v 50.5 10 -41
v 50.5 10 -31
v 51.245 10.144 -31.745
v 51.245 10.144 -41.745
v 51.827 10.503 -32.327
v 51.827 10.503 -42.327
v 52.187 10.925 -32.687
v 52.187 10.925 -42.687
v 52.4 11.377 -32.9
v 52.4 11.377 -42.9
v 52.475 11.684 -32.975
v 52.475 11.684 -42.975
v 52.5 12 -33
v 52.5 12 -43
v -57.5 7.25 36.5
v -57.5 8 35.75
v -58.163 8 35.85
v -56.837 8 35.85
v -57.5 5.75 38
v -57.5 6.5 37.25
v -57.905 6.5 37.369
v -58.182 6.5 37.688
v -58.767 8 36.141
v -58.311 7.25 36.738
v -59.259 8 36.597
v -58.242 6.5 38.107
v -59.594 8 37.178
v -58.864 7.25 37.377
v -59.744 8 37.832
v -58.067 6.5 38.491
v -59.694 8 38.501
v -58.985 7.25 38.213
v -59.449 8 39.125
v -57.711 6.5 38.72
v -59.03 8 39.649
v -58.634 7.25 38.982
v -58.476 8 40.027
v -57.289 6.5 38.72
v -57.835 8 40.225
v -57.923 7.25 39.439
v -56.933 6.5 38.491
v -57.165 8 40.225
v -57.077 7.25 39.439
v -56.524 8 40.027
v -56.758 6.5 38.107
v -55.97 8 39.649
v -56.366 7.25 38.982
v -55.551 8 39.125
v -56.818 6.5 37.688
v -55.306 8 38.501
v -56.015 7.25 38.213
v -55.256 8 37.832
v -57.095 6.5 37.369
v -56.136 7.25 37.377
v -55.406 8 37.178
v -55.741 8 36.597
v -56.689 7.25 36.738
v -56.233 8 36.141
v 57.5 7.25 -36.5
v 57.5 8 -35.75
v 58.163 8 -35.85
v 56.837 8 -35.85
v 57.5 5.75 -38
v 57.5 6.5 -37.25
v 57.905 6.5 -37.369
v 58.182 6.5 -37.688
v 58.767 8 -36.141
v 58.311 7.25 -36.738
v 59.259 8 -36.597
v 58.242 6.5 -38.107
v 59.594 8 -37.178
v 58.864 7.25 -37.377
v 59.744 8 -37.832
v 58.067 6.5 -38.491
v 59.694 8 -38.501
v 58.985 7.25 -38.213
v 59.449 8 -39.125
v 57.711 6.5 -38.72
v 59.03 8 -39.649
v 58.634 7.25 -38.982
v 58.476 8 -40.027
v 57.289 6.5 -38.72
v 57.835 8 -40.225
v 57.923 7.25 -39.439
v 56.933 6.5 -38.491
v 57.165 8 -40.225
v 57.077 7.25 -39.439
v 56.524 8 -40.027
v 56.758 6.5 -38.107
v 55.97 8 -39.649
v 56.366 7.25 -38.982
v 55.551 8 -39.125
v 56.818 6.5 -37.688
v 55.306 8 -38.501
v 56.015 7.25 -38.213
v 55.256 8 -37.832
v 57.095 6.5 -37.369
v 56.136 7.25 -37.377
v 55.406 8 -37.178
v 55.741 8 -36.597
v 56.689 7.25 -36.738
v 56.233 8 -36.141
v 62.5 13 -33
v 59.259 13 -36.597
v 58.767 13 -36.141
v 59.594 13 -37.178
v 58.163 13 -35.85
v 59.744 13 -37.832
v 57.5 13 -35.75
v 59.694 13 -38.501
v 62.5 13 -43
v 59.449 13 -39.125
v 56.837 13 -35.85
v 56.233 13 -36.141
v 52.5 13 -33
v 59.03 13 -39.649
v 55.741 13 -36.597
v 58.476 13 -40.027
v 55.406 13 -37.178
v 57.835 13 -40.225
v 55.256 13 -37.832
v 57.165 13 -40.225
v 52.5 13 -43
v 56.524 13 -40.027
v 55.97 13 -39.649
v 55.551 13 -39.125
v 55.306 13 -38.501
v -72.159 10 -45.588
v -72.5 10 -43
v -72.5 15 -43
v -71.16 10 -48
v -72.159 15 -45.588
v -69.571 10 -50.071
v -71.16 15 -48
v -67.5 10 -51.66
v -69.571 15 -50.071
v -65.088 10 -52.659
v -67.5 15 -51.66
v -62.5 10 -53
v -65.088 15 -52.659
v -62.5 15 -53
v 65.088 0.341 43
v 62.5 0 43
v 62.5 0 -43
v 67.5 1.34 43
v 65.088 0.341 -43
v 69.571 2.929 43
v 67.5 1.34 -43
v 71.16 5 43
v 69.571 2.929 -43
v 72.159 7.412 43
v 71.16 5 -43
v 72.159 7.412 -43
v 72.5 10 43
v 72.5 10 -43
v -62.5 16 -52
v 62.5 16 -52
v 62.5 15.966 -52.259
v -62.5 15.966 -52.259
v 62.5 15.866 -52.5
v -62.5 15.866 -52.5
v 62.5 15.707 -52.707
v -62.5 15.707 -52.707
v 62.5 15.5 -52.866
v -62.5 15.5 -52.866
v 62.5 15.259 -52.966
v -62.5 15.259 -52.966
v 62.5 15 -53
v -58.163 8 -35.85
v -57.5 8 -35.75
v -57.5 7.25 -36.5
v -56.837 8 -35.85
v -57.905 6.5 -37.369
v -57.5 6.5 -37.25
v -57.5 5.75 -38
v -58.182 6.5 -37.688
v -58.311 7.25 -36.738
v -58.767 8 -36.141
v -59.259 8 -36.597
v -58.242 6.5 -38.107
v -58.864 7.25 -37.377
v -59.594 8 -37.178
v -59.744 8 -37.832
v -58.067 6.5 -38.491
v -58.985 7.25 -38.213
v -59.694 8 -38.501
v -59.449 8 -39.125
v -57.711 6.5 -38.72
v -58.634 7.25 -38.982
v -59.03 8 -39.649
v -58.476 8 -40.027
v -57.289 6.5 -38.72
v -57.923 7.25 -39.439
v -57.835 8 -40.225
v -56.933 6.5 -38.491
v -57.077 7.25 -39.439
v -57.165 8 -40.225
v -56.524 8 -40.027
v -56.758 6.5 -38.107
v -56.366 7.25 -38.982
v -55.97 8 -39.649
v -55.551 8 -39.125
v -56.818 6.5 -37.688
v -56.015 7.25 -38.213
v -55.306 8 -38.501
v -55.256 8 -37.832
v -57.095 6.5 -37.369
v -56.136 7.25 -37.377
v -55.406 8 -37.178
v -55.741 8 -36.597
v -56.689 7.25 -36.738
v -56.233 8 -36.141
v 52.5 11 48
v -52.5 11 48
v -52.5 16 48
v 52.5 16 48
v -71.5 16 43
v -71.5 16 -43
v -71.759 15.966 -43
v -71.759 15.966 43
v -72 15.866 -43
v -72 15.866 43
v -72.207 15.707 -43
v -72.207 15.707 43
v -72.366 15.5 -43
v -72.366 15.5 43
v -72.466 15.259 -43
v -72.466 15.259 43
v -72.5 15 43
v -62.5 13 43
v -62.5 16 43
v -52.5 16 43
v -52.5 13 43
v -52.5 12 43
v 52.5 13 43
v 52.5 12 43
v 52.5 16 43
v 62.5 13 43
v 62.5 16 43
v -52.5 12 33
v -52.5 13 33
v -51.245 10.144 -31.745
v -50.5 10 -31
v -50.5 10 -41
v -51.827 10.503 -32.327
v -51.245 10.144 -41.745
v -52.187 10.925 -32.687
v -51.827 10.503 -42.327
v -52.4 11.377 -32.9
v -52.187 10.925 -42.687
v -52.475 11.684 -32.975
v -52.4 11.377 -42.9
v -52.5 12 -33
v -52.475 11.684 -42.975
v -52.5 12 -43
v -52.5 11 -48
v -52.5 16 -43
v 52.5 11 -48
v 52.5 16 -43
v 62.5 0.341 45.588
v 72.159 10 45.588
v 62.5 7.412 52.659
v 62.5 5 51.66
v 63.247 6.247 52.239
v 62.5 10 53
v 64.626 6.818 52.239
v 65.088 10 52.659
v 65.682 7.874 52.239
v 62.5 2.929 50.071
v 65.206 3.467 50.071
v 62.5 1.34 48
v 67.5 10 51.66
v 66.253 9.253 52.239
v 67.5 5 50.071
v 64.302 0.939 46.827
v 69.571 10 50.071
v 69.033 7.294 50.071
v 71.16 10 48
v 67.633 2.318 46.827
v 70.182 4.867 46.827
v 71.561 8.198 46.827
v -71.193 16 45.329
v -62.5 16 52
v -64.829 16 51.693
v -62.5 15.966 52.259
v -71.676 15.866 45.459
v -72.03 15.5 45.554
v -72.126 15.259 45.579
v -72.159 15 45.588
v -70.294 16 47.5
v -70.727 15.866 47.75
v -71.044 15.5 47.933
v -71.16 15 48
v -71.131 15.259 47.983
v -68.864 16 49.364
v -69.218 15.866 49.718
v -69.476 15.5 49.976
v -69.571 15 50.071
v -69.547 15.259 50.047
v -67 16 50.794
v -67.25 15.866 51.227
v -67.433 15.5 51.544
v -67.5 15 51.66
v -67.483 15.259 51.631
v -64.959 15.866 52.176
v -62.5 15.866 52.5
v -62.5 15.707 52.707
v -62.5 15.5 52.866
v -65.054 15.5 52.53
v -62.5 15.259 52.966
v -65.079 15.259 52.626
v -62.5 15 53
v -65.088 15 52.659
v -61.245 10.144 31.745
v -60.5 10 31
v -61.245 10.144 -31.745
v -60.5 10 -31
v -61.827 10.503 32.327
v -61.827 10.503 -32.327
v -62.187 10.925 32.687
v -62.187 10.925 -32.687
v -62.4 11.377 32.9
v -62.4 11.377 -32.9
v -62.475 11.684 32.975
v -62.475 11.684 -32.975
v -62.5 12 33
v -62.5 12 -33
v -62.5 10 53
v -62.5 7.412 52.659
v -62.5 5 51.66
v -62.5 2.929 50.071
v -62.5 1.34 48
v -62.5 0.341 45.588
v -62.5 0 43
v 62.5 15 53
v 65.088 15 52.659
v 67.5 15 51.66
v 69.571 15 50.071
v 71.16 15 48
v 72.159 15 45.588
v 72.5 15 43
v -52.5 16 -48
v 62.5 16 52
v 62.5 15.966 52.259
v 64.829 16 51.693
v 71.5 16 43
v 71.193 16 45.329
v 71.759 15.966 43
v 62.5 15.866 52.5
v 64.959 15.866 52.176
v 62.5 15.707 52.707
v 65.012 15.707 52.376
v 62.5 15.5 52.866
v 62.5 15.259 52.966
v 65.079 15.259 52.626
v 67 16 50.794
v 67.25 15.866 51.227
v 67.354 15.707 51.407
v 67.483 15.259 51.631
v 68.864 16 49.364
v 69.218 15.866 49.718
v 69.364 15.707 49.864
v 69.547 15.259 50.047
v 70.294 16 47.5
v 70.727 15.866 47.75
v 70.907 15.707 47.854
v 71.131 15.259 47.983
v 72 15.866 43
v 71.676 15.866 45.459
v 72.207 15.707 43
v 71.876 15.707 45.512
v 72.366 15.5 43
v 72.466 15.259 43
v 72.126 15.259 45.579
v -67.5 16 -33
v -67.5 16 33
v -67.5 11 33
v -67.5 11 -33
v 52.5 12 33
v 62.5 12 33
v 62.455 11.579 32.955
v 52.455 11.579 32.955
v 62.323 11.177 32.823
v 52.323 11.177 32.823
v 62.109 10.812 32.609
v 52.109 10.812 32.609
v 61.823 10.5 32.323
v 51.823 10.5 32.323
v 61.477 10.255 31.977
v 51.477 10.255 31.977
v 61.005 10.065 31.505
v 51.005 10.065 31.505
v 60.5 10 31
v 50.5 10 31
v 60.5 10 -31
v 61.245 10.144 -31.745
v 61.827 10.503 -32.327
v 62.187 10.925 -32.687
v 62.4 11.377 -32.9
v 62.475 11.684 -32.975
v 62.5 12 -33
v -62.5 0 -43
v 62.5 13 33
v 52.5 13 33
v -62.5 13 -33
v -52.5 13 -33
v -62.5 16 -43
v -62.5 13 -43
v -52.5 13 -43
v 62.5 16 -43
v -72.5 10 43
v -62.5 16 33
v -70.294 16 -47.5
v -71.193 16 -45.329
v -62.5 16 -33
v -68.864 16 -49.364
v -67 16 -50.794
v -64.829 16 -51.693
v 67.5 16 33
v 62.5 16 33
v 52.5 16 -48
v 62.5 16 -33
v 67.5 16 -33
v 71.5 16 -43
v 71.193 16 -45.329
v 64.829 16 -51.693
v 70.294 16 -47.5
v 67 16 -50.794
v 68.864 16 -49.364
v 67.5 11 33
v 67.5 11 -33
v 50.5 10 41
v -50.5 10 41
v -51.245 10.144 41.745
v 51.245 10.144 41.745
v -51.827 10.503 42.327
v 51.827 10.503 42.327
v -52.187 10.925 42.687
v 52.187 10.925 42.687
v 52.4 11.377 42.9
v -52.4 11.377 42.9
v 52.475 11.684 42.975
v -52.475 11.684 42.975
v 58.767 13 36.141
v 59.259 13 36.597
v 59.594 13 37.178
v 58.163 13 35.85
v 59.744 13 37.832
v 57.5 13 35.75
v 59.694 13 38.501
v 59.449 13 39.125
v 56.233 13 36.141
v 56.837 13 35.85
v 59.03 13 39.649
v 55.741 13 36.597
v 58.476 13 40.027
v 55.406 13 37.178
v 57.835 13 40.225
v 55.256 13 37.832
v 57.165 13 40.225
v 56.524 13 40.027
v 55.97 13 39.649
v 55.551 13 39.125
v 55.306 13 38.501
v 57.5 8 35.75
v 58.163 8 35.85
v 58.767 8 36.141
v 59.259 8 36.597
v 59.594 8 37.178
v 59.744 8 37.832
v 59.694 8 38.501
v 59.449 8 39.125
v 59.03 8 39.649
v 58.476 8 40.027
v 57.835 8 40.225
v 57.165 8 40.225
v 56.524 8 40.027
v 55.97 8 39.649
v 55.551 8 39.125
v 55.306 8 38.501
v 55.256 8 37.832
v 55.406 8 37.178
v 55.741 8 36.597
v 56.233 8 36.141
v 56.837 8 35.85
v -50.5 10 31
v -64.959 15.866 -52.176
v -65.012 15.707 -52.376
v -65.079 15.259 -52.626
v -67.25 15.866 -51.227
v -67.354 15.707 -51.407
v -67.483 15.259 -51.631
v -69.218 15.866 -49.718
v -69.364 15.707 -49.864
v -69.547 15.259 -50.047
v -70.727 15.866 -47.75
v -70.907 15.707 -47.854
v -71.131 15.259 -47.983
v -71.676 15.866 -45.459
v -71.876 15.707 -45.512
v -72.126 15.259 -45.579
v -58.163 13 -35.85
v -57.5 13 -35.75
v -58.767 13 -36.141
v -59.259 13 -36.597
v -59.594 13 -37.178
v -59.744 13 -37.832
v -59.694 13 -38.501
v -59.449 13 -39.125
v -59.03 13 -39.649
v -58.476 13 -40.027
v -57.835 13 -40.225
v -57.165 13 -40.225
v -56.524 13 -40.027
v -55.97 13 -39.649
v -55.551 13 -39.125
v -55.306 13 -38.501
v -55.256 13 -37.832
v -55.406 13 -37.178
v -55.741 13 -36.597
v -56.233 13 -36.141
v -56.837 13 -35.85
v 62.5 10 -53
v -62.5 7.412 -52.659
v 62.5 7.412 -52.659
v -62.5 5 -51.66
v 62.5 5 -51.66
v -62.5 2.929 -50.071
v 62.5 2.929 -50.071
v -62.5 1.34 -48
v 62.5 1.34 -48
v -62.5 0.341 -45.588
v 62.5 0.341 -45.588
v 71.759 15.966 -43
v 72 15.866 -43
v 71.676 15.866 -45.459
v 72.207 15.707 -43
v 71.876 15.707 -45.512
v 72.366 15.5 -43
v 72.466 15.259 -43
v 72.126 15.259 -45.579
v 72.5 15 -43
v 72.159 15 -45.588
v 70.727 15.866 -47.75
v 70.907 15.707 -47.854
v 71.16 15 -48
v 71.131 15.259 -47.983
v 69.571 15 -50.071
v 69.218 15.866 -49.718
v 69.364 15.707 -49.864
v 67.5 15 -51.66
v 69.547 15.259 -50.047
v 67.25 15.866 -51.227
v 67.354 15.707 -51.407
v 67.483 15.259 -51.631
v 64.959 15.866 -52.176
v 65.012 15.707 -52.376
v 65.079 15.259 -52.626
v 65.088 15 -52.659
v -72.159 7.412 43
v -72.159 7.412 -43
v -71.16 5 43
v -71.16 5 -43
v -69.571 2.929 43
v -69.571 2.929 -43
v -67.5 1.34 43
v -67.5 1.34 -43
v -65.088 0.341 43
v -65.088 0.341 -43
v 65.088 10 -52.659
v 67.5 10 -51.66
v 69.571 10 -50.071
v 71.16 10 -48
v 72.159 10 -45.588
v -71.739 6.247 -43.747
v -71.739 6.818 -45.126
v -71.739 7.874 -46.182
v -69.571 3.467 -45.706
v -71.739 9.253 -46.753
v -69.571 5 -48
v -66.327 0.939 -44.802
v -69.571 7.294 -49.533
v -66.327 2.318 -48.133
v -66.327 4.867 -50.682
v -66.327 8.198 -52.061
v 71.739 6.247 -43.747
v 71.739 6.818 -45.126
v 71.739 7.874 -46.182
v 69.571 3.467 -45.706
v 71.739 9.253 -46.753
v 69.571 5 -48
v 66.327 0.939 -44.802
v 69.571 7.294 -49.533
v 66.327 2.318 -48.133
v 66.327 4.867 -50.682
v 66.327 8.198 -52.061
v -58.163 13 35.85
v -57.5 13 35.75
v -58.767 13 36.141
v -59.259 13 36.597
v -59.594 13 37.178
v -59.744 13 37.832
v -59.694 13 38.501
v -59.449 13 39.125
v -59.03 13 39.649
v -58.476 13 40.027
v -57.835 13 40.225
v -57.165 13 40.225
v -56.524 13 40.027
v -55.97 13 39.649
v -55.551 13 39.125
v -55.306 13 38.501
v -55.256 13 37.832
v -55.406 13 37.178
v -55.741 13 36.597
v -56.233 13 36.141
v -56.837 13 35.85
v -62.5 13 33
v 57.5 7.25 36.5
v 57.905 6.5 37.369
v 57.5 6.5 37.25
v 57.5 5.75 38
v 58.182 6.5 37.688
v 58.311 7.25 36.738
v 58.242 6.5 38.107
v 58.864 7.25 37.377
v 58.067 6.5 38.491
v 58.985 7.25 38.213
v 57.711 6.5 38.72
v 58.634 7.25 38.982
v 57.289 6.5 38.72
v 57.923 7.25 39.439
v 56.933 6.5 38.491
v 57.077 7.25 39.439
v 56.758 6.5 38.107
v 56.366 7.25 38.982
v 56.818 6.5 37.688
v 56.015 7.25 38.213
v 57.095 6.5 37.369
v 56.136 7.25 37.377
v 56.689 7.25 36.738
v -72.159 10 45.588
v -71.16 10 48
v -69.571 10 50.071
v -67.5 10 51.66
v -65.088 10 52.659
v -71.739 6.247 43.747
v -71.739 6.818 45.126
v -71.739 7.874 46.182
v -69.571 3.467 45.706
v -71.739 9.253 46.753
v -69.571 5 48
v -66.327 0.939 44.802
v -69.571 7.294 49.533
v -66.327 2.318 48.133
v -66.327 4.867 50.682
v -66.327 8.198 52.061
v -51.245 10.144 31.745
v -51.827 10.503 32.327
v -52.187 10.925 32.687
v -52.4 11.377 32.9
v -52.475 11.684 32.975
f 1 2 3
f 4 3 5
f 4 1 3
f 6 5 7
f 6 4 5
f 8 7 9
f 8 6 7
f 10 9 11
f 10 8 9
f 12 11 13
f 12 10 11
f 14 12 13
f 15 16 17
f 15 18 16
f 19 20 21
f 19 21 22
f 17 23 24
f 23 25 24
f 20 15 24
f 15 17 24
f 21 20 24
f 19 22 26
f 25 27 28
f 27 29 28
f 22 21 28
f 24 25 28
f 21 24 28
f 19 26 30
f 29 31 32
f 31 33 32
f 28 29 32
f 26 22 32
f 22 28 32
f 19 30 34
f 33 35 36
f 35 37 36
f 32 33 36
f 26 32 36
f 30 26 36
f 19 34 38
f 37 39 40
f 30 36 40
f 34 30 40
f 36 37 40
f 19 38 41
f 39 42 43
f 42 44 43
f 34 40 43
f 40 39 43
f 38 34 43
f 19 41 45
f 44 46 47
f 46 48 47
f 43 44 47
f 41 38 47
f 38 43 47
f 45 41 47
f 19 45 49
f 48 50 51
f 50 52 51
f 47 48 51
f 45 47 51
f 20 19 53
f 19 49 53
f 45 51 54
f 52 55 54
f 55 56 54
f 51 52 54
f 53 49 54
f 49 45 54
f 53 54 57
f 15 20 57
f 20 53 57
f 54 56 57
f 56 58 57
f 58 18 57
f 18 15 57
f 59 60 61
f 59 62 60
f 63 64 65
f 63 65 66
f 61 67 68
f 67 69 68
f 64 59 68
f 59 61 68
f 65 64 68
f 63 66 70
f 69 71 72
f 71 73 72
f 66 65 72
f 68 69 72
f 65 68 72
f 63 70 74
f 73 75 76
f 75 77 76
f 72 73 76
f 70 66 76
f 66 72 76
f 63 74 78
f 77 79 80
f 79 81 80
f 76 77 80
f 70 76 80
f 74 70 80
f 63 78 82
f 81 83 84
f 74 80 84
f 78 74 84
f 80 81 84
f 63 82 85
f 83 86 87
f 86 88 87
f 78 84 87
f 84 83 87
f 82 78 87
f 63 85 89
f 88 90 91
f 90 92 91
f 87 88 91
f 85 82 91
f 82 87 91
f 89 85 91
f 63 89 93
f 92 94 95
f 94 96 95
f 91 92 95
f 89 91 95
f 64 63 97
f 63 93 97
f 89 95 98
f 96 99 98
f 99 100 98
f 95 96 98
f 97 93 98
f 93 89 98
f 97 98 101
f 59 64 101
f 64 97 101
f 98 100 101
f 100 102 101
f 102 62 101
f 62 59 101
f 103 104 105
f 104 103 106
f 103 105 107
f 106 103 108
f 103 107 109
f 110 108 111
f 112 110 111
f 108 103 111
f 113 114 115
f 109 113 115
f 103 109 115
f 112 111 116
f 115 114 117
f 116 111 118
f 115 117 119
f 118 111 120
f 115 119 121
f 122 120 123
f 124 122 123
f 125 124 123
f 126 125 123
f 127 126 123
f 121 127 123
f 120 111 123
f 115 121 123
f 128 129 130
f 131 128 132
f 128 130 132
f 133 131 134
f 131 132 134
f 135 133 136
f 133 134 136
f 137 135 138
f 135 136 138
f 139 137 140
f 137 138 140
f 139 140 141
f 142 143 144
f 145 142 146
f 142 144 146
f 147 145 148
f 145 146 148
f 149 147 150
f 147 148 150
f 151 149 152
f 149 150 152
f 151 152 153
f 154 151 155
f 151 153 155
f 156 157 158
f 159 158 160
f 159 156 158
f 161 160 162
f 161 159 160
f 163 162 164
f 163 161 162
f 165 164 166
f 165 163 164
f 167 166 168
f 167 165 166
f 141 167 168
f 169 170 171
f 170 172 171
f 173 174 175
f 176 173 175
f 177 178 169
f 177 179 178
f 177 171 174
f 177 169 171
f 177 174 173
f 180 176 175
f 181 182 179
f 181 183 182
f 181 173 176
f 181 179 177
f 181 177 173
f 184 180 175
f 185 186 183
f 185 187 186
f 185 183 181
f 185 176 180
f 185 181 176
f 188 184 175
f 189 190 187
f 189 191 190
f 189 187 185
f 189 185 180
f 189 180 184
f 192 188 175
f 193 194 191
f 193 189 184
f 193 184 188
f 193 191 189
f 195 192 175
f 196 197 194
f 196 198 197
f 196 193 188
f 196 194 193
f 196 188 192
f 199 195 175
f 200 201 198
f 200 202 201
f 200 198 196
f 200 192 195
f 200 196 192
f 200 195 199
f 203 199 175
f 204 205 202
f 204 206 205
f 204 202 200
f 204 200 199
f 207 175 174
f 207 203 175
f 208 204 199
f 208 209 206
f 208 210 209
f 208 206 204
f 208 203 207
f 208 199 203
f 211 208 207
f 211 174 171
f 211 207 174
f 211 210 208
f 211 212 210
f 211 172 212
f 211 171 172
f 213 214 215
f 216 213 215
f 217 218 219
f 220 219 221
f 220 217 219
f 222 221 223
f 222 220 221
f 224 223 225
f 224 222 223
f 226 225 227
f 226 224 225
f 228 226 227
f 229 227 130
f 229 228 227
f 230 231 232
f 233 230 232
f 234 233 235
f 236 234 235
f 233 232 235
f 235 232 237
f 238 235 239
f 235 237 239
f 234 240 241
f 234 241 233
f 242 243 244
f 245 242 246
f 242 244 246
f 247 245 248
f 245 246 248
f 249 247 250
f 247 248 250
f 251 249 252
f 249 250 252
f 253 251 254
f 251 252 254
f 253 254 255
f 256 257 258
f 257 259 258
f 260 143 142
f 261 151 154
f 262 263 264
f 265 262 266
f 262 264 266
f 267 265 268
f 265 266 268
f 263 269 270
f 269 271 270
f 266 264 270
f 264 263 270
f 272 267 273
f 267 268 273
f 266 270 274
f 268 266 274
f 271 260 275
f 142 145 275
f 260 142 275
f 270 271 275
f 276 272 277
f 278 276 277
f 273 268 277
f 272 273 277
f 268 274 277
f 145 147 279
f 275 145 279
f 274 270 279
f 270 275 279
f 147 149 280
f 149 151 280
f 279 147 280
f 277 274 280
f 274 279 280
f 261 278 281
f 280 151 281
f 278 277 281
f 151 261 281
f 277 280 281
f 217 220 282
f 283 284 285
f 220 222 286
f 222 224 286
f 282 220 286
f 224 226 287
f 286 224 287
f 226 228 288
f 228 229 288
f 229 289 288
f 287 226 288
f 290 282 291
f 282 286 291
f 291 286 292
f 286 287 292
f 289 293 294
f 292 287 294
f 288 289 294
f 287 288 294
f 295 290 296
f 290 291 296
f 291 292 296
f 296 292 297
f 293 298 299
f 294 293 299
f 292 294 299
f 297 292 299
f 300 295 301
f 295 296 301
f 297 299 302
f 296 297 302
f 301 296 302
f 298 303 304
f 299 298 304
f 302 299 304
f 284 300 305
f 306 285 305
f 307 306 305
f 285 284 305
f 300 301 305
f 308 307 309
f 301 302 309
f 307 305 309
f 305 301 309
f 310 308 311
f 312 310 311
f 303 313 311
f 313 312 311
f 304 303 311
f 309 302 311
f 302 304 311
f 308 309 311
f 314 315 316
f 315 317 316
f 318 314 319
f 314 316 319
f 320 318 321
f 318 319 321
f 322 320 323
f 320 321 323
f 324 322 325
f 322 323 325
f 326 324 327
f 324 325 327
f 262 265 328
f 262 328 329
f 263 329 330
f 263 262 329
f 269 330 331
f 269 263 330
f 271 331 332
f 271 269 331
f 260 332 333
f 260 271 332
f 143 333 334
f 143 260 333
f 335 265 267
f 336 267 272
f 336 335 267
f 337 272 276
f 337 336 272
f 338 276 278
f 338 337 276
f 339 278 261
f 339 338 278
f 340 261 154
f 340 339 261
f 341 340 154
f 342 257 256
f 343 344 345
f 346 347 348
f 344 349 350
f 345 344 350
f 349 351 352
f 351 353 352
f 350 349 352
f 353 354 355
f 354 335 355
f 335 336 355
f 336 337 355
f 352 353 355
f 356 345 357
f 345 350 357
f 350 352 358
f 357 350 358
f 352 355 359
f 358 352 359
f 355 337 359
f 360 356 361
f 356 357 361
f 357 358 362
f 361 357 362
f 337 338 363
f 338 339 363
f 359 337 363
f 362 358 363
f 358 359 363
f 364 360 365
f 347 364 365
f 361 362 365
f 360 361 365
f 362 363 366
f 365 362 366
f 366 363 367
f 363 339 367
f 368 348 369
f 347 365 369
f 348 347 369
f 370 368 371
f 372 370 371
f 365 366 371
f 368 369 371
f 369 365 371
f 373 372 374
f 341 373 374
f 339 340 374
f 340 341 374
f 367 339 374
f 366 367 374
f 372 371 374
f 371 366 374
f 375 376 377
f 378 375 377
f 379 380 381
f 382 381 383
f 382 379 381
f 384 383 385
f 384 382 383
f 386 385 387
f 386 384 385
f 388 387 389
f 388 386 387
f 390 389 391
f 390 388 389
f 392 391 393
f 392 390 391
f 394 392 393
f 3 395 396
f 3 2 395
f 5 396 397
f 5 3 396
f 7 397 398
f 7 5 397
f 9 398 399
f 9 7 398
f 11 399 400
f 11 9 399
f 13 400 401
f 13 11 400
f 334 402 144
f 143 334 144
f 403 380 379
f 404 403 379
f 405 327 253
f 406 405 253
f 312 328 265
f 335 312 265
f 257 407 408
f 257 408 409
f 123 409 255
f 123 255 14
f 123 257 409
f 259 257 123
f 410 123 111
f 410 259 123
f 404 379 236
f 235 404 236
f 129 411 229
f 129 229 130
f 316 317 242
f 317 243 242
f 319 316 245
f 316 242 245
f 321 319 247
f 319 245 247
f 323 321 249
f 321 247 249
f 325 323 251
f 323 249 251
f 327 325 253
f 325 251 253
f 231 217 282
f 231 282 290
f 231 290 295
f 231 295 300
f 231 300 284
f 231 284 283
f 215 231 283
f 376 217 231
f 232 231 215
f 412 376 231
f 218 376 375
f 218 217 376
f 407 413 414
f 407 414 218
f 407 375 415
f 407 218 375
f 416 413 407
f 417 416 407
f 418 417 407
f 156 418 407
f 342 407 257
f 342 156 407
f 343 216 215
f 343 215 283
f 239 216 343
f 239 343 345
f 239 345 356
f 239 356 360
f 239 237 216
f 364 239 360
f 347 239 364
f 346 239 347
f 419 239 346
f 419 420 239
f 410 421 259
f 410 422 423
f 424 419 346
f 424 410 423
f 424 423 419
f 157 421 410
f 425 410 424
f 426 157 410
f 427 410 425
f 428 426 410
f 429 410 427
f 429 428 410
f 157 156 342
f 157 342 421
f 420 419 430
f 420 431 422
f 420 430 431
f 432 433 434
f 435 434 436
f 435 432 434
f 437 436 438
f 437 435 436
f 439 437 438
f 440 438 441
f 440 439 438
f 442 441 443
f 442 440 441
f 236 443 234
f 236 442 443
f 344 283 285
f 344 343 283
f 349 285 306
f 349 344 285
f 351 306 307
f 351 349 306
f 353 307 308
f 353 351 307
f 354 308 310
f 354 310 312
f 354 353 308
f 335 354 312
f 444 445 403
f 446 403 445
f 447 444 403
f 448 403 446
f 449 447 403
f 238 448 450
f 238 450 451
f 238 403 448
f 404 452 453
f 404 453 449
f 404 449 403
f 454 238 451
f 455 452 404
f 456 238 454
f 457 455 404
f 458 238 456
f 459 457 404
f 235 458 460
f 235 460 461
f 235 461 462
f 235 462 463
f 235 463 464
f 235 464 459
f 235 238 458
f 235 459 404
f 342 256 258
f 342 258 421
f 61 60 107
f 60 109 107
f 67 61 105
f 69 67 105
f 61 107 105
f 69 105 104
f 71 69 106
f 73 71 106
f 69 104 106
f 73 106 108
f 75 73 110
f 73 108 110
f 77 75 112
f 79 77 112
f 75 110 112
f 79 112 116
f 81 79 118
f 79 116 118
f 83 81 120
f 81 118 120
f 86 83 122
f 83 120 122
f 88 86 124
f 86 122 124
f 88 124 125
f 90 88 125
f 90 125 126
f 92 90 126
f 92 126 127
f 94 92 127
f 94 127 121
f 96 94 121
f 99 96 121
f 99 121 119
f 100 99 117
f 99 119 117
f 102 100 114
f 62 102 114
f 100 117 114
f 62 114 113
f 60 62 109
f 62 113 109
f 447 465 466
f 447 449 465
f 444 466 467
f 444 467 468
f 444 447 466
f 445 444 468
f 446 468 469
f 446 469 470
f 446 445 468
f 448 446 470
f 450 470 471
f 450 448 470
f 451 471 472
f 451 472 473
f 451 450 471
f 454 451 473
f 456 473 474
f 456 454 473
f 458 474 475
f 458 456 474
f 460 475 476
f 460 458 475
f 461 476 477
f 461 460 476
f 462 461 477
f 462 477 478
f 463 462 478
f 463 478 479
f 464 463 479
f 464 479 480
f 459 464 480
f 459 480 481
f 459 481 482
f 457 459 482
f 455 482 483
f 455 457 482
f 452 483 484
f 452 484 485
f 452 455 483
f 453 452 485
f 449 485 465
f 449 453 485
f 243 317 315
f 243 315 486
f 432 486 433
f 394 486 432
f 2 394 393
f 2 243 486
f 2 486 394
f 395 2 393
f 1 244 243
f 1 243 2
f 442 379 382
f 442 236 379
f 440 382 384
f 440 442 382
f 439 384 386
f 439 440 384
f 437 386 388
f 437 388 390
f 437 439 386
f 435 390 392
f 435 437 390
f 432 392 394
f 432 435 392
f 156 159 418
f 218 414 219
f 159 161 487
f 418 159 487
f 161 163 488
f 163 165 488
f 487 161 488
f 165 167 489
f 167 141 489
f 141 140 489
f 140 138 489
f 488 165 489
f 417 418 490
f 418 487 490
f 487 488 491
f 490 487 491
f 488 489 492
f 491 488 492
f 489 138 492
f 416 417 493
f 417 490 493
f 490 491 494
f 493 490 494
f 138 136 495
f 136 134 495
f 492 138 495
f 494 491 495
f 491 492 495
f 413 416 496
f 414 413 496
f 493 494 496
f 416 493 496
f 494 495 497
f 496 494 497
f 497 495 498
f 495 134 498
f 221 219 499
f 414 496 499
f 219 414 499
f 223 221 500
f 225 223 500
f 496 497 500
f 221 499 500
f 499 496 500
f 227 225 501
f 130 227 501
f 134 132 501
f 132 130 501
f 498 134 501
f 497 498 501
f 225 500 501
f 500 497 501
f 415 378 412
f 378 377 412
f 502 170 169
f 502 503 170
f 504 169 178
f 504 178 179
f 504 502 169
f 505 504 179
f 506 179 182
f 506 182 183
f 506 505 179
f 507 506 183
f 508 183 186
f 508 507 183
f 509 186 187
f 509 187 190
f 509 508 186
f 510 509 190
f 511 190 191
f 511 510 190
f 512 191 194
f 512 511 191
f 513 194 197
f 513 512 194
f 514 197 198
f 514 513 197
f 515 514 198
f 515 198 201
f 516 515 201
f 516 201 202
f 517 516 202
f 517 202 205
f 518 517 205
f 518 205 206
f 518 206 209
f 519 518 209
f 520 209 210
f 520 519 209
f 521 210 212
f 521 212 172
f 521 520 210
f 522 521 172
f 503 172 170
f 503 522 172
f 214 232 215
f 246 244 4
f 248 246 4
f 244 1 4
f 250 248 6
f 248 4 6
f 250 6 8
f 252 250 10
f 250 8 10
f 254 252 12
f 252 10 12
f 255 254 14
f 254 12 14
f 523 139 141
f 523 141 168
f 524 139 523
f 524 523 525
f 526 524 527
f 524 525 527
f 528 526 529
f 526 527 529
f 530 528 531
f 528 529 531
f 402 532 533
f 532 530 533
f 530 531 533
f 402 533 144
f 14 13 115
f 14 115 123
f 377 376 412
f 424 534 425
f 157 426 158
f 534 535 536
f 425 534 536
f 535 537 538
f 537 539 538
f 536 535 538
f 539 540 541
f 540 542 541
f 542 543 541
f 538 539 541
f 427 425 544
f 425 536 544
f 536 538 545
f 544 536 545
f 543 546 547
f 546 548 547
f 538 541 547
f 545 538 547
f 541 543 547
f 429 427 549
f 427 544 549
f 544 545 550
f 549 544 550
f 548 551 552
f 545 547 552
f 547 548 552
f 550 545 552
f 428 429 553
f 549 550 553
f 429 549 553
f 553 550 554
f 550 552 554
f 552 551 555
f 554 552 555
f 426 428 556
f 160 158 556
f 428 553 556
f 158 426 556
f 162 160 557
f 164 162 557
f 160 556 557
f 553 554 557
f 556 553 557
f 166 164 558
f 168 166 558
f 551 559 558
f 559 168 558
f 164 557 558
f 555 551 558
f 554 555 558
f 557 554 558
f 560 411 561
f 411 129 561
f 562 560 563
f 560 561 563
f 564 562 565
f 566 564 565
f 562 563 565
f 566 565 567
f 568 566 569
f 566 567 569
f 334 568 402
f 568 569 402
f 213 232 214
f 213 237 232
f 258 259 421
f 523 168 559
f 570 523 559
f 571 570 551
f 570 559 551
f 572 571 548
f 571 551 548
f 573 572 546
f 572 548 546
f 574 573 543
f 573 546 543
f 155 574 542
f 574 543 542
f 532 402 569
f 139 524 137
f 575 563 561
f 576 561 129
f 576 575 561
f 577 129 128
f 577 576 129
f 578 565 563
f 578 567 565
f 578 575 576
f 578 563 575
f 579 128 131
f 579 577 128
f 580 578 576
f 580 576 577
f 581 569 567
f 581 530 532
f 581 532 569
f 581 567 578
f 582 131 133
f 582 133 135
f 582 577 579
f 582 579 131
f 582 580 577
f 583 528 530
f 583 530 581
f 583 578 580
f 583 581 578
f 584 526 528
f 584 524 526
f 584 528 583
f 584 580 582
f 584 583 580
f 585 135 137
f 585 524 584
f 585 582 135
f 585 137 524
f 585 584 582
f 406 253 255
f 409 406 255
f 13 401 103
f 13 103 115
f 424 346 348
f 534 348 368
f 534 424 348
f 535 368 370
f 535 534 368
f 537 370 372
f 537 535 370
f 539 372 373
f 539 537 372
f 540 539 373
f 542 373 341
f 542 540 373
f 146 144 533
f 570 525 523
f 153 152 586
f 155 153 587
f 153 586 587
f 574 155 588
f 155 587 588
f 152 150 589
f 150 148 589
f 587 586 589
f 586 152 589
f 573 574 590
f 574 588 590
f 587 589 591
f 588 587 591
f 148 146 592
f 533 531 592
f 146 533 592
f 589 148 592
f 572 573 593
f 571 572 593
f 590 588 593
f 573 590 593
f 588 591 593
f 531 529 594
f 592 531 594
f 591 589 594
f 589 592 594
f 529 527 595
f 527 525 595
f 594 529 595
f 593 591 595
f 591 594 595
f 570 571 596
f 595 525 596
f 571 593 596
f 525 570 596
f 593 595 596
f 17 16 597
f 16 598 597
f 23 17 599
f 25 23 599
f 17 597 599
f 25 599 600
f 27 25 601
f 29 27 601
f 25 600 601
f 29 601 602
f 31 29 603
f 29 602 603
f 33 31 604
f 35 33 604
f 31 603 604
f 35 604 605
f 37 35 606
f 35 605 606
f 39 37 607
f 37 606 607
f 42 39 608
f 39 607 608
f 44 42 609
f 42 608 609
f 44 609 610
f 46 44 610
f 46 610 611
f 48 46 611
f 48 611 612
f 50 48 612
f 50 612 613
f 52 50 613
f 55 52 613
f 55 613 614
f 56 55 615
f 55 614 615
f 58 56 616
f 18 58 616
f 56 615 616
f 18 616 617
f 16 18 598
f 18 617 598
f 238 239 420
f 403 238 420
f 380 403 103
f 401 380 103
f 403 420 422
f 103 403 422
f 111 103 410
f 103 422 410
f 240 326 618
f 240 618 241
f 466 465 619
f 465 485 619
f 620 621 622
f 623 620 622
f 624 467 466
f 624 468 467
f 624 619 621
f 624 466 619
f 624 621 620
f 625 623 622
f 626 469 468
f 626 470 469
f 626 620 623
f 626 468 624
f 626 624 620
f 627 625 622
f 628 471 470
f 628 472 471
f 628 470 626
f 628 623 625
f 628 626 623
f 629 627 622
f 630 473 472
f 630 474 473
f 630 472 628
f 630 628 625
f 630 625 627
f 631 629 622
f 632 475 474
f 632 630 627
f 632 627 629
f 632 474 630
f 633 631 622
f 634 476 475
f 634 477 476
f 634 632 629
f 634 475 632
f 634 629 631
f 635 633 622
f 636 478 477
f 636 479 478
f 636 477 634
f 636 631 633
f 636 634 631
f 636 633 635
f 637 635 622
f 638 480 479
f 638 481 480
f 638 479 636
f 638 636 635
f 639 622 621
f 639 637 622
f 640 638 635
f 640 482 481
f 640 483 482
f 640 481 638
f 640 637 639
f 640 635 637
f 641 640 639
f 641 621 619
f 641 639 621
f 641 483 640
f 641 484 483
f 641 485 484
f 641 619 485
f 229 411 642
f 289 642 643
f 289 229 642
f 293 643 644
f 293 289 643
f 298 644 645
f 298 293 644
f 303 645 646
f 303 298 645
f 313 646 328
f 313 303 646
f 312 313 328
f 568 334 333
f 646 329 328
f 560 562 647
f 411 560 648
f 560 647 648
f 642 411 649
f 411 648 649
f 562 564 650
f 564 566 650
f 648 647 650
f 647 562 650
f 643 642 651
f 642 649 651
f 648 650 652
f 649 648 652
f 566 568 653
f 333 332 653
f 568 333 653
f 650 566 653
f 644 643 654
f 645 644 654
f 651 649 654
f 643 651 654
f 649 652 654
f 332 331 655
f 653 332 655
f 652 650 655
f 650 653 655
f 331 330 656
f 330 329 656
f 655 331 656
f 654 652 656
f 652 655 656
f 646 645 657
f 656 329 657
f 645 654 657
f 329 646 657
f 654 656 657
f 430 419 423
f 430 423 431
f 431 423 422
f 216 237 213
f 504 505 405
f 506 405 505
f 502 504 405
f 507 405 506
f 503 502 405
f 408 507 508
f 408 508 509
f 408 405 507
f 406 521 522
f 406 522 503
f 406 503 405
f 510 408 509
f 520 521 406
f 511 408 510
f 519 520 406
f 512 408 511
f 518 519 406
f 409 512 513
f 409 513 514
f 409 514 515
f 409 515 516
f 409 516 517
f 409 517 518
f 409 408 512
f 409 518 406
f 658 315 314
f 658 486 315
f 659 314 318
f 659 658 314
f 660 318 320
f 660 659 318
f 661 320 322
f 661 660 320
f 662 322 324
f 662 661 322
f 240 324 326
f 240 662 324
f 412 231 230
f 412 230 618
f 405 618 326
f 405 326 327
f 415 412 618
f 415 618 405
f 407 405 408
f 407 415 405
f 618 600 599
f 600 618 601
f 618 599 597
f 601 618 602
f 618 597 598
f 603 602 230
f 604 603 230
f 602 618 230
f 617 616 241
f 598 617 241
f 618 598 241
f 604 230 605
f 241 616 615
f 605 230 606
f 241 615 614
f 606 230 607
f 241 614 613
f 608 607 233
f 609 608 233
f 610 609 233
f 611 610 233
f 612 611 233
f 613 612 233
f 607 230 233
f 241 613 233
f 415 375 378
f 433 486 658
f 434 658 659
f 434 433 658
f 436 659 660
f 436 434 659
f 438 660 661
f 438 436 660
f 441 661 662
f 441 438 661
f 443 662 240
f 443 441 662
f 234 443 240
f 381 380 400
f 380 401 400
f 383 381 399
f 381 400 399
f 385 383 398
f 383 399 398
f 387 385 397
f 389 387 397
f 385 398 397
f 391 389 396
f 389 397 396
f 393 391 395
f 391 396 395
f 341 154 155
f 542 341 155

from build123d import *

# Parameters (mm, degrees)
SKETCH1_W               = 145
SKETCH1_H               = 106
BOSS_EXTRUDE1_DEPTH     = 16
CUT_EXTRUDE1_START      = 16
SKETCH1_4_W             = 125
SKETCH1_4_H             = 86
CUT_EXTRUDE1_DEPTH      = 6
CUT_EXTRUDE3_DEPTH      = 52.5
CUT_EXTRUDE4_DEPTH      = 33
FILLET1_R               = 10
SKETCH5_W               = 10
SKETCH5_H               = 10
BOSS_EXTRUDE3_DEPTH     = 3
MIRROR6_COPY_1_SKETCH_W = 10
MIRROR6_COPY_1_SKETCH_H = 10
MIRROR6_COPY_1_DEPTH    = 3
FILLET3_R               = 2
FILLET11_R              = 1


with BuildPart() as part:
    # Sketch1 → Boss-Extrude1 (new body)
    with BuildSketch(Plane(origin=(0, 0, 0), x_dir=(1, 0, 0), z_dir=(0, 1, 0))):
        Rectangle(SKETCH1_W, SKETCH1_H)
    extrude(amount=BOSS_EXTRUDE1_DEPTH)

    # Sketch1<4> → Cut-Extrude1 (cut)
    with BuildSketch(Plane(origin=(0, 0, 0), x_dir=(1, 0, 0), z_dir=(0, 1, 0)).offset(CUT_EXTRUDE1_START)):
        Rectangle(SKETCH1_4_W, SKETCH1_4_H)
    extrude(amount=-CUT_EXTRUDE1_DEPTH, mode=Mode.SUBTRACT)

    # Sketch3 → Cut-Extrude3 (cut, symmetric)
    with BuildSketch(Plane(origin=(0, 0, 0), x_dir=(0, 0, -1), z_dir=(1, 0, 0))):
        Polygon((-48, 16), (-43, 16), (-48, 11), align=None)
    cut_extrude3 = extrude(amount=CUT_EXTRUDE3_DEPTH, both=True, mode=Mode.SUBTRACT)

    # Sketch4 → Cut-Extrude4 (cut, symmetric)
    with BuildSketch(Plane.XY):
        Polygon((-62.5, 16), (-67.5, 16), (-67.5, 11), align=None)
    cut_extrude4 = extrude(amount=CUT_EXTRUDE4_DEPTH, both=True, mode=Mode.SUBTRACT)

    # Mirror1: Cut-Extrude4 across plane
    add(cut_extrude4.mirror(Plane(origin=(0, 0, 0), x_dir=(0, 0, 1), z_dir=(1, 0, 0))), mode=Mode.SUBTRACT)

    # Mirror4: Cut-Extrude3 across plane
    add(cut_extrude3.mirror(Plane.XY), mode=Mode.SUBTRACT)

    # Fillet1
    fillet1_edges = [part.edges().sort_by_distance(p)[0] for p in [
        (0, 0, -53),
        (72.5, 0, 0),
        (0, 0, 53),
        (-72.5, 0, 0),
        (-72.5, 8, -53),
        (72.5, 8, -53),
        (72.5, 8, 53),
        (-72.5, 8, 53),
    ]]
    fillet(fillet1_edges, radius=FILLET1_R)

    # Sketch5 → Boss-Extrude3 (add)
    with BuildSketch(Plane(origin=(0, 10, 0), x_dir=(1, 0, 0), z_dir=(0, 1, 0))):
        with Locations((-57.5, 38)):
            Rectangle(SKETCH5_W, SKETCH5_H)
    boss_extrude3 = extrude(amount=BOSS_EXTRUDE3_DEPTH)

    # Sketch7 → M4 Clearance Hole1 (revolve, cut)
    with BuildSketch(Plane(origin=(-57.5, 13, -38), x_dir=(0, 0, 1), z_dir=(1, 0, 0))):
        Polygon((0, 0), (0, 7.25), (2.25, 5), (2.25, 0), align=None)
    m4_clearance_hole1 = revolve(axis=Axis((-57.5, 19.35, -38), (0, -1, 0)), mode=Mode.SUBTRACT)

    # Mirror5: Boss-Extrude3, M4 Clearance Hole1 across plane
    add(boss_extrude3.mirror(Plane.XY))
    add(m4_clearance_hole1.mirror(Plane.XY), mode=Mode.SUBTRACT)

    # Mirror6: Boss-Extrude3, M4 Clearance Hole1 across plane
    add(boss_extrude3.mirror(Plane(origin=(0, 0, 0), x_dir=(0, 0, 1), z_dir=(1, 0, 0))))
    add(m4_clearance_hole1.mirror(Plane(origin=(0, 0, 0), x_dir=(0, 0, 1), z_dir=(1, 0, 0))), mode=Mode.SUBTRACT)

    # Mirror6 copy 1 sketch → Mirror6 copy 1 (add)
    with BuildSketch(Plane(origin=(0, 10, 0), x_dir=(-1, 0, 0), z_dir=(0, 1, 0))):
        with Locations((-57.5, 38)):
            Rectangle(MIRROR6_COPY_1_SKETCH_W, MIRROR6_COPY_1_SKETCH_H)
    extrude(amount=MIRROR6_COPY_1_DEPTH)

    # Mirror6 copy 2 sketch → Mirror6 copy 2 (revolve, cut)
    with BuildSketch(Plane(origin=(57.5, 13, 38), x_dir=(0, 0, -1), z_dir=(-1, 0, 0))):
        Polygon((0, 0), (0, 7.25), (2.25, 5), (2.25, 0), align=None)
    revolve(axis=Axis((57.5, 19.35, 38), (0, -1, 0)), mode=Mode.SUBTRACT)

    # Fillet3
    fillet3_edges = [part.edges().sort_by_distance(p)[0] for p in [
        (-52.5, 10, -38),
        (-57.5, 10, -33),
        (-62.5, 10, 0),
        (-57.5, 10, 33),
        (-52.5, 10, 38),
        (0, 10, -43),
        (57.5, 10, -33),
        (52.5, 10, -38),
        (0, 10, 43),
        (62.5, 10, 0),
        (52.5, 10, 38),
        (57.5, 10, 33),
    ]]
    fillet(fillet3_edges, radius=FILLET3_R)

    # Fillet11
    fillet11_edges = [part.edges().sort_by_distance(p)[0] for p in [
        (0, 16, 53),
        (72.5, 16, 0),
        (0, 16, -53),
        (-72.5, 16, 0),
        (-69.571067812, 16, 50.071067812),
        (69.571067812, 16, 50.071067812),
        (69.571067812, 16, -50.071067812),
        (-69.571067812, 16, -50.071067812),
    ]]
    fillet(fillet11_edges, radius=FILLET11_R)


solid = part.part
